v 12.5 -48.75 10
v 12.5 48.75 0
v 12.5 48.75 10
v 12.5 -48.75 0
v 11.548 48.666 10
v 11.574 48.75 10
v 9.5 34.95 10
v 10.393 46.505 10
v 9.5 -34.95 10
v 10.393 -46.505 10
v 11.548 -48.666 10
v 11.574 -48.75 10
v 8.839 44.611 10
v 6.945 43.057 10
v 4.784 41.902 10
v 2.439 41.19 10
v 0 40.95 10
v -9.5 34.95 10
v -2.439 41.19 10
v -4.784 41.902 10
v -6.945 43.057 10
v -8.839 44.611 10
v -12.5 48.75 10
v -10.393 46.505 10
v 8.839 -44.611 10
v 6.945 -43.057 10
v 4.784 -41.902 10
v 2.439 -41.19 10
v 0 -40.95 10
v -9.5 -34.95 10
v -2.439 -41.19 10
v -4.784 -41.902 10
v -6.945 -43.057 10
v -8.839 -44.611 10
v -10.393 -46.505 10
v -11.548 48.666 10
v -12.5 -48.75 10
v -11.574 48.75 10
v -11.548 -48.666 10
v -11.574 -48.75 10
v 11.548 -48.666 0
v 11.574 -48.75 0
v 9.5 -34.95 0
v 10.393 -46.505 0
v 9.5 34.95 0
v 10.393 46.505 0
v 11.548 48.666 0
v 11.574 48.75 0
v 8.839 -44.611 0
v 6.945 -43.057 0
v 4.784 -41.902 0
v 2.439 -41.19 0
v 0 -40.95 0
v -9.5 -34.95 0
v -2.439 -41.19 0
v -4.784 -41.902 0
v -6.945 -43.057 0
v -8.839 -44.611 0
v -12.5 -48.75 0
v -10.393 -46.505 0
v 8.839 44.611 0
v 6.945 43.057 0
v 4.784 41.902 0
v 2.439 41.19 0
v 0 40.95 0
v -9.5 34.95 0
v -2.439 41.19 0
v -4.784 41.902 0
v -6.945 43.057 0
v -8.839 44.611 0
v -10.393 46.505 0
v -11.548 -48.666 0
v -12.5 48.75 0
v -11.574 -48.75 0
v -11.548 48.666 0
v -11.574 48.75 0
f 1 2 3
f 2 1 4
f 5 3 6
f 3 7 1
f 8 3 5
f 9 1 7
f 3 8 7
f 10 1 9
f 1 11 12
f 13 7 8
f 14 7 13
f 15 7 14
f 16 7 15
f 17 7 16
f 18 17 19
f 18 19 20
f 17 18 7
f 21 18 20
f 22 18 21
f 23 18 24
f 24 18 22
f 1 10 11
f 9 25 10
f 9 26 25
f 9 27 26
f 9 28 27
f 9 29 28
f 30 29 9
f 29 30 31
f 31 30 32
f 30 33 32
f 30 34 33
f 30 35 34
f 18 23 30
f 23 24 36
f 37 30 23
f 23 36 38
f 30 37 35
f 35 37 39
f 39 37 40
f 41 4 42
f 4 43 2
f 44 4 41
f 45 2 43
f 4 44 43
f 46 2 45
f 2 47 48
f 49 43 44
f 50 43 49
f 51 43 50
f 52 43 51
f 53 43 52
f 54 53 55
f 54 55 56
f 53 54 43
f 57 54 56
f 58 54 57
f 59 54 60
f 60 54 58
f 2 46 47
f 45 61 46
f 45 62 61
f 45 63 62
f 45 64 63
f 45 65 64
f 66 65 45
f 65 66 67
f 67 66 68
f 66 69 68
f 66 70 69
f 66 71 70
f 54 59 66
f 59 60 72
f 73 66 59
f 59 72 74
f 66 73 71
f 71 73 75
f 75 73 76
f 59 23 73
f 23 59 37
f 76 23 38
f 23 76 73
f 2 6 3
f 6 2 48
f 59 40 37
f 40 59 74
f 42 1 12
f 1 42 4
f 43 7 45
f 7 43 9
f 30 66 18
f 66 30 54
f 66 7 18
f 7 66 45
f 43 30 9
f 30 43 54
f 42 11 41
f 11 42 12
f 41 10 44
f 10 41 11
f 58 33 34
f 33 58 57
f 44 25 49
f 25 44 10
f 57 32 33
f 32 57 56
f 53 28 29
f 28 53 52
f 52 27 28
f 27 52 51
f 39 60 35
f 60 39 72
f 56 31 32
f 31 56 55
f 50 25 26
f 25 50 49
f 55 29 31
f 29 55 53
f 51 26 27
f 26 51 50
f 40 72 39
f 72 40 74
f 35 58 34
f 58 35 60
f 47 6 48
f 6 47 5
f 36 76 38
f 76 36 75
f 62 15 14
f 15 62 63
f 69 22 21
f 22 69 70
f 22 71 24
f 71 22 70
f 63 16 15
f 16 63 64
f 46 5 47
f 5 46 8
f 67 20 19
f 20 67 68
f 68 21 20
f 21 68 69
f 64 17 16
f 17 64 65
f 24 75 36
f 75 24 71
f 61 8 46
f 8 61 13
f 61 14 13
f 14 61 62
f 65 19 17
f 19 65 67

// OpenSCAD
//Remix of http://www.thingiverse.com/thing:918871
//to make it parametric
//CUSTOMIZER VARIABLES

//1. Length of Square check (originals were 97.5mm & 140mm)
Len = 97.5;             //Original Short Length

//Len=140;              //Original Long Length

//2. Width of Square check
Wid = 25;               //Width of Part

//3. Thickness Between inside cut & pipe cut (original was 17.19mm)
LenCutThk = 6;

//4. Thickness on edges of inside cut
WidCutThk = 3;
//WidCut = 16;          //Width of Inside Cut

//5. Height of Square Check
Ht = 10;                //Height of part

//6. Pipe Dia. to use (Probably use 23.5 Standard or 25 Metric)
PipeDia = 25;         //Original Dia of Pipe was 25;

//6. Center of Pipe from end of Square Check
CylOffset = 4.7;        //Offset of pipe cut on top & bottom

//7. Resolution of Pipe cut (original was 32)
ires = 32;

//8. Print 1 or 2 Square Checks
Qty = 1;

//CUSTOMIZER VARIABLES END

$fn = ires;                 //Resolution of Pipe Cylinder cut
L2 = Len / 2;
echo("L2 = ", L2);
W2 = Wid / 2;
Y_org = (PipeDia / 2) - CylOffset;
echo("Y_org = ", Y_org);
L3 = L2 - Y_org - LenCutThk;
echo("L3 = ", L3);
LenCut2 = L3;
LenCut = LenCut2 * 2;
WidCut = Wid - (WidCutThk *2);
WidCut2 = WidCut / 2;
Cyl_Y = L2 + CylOffset;

//Draw the Main base for this part
//The main length is along the Y-axis as originally drawn
module Base()
{
    translate([-W2,-L2,0])
    cube([Wid,Len,Ht]);
}
module SquareCheck()
{
    difference()
    {
        Base();
        translate([-WidCut2,-LenCut2,-1])
        cube([WidCut,LenCut,Ht+2]);         //Cut inside cube out of part
        translate([0,-Cyl_Y,-1])
        cylinder(d=PipeDia,h=Ht+2);         //Cut bottom end for pipe
        translate([0,Cyl_Y,-1])
        cylinder(d=PipeDia,h=Ht+2);         //Cut Top end for pipe
    }
}
SquareCheck();                  //Draw 1st part
if (Qty == 2)
{
    translate([Wid+6,0,0])      //Seperate parts by 6mm
    SquareCheck();              //Maybe draw a 2nd part
}
